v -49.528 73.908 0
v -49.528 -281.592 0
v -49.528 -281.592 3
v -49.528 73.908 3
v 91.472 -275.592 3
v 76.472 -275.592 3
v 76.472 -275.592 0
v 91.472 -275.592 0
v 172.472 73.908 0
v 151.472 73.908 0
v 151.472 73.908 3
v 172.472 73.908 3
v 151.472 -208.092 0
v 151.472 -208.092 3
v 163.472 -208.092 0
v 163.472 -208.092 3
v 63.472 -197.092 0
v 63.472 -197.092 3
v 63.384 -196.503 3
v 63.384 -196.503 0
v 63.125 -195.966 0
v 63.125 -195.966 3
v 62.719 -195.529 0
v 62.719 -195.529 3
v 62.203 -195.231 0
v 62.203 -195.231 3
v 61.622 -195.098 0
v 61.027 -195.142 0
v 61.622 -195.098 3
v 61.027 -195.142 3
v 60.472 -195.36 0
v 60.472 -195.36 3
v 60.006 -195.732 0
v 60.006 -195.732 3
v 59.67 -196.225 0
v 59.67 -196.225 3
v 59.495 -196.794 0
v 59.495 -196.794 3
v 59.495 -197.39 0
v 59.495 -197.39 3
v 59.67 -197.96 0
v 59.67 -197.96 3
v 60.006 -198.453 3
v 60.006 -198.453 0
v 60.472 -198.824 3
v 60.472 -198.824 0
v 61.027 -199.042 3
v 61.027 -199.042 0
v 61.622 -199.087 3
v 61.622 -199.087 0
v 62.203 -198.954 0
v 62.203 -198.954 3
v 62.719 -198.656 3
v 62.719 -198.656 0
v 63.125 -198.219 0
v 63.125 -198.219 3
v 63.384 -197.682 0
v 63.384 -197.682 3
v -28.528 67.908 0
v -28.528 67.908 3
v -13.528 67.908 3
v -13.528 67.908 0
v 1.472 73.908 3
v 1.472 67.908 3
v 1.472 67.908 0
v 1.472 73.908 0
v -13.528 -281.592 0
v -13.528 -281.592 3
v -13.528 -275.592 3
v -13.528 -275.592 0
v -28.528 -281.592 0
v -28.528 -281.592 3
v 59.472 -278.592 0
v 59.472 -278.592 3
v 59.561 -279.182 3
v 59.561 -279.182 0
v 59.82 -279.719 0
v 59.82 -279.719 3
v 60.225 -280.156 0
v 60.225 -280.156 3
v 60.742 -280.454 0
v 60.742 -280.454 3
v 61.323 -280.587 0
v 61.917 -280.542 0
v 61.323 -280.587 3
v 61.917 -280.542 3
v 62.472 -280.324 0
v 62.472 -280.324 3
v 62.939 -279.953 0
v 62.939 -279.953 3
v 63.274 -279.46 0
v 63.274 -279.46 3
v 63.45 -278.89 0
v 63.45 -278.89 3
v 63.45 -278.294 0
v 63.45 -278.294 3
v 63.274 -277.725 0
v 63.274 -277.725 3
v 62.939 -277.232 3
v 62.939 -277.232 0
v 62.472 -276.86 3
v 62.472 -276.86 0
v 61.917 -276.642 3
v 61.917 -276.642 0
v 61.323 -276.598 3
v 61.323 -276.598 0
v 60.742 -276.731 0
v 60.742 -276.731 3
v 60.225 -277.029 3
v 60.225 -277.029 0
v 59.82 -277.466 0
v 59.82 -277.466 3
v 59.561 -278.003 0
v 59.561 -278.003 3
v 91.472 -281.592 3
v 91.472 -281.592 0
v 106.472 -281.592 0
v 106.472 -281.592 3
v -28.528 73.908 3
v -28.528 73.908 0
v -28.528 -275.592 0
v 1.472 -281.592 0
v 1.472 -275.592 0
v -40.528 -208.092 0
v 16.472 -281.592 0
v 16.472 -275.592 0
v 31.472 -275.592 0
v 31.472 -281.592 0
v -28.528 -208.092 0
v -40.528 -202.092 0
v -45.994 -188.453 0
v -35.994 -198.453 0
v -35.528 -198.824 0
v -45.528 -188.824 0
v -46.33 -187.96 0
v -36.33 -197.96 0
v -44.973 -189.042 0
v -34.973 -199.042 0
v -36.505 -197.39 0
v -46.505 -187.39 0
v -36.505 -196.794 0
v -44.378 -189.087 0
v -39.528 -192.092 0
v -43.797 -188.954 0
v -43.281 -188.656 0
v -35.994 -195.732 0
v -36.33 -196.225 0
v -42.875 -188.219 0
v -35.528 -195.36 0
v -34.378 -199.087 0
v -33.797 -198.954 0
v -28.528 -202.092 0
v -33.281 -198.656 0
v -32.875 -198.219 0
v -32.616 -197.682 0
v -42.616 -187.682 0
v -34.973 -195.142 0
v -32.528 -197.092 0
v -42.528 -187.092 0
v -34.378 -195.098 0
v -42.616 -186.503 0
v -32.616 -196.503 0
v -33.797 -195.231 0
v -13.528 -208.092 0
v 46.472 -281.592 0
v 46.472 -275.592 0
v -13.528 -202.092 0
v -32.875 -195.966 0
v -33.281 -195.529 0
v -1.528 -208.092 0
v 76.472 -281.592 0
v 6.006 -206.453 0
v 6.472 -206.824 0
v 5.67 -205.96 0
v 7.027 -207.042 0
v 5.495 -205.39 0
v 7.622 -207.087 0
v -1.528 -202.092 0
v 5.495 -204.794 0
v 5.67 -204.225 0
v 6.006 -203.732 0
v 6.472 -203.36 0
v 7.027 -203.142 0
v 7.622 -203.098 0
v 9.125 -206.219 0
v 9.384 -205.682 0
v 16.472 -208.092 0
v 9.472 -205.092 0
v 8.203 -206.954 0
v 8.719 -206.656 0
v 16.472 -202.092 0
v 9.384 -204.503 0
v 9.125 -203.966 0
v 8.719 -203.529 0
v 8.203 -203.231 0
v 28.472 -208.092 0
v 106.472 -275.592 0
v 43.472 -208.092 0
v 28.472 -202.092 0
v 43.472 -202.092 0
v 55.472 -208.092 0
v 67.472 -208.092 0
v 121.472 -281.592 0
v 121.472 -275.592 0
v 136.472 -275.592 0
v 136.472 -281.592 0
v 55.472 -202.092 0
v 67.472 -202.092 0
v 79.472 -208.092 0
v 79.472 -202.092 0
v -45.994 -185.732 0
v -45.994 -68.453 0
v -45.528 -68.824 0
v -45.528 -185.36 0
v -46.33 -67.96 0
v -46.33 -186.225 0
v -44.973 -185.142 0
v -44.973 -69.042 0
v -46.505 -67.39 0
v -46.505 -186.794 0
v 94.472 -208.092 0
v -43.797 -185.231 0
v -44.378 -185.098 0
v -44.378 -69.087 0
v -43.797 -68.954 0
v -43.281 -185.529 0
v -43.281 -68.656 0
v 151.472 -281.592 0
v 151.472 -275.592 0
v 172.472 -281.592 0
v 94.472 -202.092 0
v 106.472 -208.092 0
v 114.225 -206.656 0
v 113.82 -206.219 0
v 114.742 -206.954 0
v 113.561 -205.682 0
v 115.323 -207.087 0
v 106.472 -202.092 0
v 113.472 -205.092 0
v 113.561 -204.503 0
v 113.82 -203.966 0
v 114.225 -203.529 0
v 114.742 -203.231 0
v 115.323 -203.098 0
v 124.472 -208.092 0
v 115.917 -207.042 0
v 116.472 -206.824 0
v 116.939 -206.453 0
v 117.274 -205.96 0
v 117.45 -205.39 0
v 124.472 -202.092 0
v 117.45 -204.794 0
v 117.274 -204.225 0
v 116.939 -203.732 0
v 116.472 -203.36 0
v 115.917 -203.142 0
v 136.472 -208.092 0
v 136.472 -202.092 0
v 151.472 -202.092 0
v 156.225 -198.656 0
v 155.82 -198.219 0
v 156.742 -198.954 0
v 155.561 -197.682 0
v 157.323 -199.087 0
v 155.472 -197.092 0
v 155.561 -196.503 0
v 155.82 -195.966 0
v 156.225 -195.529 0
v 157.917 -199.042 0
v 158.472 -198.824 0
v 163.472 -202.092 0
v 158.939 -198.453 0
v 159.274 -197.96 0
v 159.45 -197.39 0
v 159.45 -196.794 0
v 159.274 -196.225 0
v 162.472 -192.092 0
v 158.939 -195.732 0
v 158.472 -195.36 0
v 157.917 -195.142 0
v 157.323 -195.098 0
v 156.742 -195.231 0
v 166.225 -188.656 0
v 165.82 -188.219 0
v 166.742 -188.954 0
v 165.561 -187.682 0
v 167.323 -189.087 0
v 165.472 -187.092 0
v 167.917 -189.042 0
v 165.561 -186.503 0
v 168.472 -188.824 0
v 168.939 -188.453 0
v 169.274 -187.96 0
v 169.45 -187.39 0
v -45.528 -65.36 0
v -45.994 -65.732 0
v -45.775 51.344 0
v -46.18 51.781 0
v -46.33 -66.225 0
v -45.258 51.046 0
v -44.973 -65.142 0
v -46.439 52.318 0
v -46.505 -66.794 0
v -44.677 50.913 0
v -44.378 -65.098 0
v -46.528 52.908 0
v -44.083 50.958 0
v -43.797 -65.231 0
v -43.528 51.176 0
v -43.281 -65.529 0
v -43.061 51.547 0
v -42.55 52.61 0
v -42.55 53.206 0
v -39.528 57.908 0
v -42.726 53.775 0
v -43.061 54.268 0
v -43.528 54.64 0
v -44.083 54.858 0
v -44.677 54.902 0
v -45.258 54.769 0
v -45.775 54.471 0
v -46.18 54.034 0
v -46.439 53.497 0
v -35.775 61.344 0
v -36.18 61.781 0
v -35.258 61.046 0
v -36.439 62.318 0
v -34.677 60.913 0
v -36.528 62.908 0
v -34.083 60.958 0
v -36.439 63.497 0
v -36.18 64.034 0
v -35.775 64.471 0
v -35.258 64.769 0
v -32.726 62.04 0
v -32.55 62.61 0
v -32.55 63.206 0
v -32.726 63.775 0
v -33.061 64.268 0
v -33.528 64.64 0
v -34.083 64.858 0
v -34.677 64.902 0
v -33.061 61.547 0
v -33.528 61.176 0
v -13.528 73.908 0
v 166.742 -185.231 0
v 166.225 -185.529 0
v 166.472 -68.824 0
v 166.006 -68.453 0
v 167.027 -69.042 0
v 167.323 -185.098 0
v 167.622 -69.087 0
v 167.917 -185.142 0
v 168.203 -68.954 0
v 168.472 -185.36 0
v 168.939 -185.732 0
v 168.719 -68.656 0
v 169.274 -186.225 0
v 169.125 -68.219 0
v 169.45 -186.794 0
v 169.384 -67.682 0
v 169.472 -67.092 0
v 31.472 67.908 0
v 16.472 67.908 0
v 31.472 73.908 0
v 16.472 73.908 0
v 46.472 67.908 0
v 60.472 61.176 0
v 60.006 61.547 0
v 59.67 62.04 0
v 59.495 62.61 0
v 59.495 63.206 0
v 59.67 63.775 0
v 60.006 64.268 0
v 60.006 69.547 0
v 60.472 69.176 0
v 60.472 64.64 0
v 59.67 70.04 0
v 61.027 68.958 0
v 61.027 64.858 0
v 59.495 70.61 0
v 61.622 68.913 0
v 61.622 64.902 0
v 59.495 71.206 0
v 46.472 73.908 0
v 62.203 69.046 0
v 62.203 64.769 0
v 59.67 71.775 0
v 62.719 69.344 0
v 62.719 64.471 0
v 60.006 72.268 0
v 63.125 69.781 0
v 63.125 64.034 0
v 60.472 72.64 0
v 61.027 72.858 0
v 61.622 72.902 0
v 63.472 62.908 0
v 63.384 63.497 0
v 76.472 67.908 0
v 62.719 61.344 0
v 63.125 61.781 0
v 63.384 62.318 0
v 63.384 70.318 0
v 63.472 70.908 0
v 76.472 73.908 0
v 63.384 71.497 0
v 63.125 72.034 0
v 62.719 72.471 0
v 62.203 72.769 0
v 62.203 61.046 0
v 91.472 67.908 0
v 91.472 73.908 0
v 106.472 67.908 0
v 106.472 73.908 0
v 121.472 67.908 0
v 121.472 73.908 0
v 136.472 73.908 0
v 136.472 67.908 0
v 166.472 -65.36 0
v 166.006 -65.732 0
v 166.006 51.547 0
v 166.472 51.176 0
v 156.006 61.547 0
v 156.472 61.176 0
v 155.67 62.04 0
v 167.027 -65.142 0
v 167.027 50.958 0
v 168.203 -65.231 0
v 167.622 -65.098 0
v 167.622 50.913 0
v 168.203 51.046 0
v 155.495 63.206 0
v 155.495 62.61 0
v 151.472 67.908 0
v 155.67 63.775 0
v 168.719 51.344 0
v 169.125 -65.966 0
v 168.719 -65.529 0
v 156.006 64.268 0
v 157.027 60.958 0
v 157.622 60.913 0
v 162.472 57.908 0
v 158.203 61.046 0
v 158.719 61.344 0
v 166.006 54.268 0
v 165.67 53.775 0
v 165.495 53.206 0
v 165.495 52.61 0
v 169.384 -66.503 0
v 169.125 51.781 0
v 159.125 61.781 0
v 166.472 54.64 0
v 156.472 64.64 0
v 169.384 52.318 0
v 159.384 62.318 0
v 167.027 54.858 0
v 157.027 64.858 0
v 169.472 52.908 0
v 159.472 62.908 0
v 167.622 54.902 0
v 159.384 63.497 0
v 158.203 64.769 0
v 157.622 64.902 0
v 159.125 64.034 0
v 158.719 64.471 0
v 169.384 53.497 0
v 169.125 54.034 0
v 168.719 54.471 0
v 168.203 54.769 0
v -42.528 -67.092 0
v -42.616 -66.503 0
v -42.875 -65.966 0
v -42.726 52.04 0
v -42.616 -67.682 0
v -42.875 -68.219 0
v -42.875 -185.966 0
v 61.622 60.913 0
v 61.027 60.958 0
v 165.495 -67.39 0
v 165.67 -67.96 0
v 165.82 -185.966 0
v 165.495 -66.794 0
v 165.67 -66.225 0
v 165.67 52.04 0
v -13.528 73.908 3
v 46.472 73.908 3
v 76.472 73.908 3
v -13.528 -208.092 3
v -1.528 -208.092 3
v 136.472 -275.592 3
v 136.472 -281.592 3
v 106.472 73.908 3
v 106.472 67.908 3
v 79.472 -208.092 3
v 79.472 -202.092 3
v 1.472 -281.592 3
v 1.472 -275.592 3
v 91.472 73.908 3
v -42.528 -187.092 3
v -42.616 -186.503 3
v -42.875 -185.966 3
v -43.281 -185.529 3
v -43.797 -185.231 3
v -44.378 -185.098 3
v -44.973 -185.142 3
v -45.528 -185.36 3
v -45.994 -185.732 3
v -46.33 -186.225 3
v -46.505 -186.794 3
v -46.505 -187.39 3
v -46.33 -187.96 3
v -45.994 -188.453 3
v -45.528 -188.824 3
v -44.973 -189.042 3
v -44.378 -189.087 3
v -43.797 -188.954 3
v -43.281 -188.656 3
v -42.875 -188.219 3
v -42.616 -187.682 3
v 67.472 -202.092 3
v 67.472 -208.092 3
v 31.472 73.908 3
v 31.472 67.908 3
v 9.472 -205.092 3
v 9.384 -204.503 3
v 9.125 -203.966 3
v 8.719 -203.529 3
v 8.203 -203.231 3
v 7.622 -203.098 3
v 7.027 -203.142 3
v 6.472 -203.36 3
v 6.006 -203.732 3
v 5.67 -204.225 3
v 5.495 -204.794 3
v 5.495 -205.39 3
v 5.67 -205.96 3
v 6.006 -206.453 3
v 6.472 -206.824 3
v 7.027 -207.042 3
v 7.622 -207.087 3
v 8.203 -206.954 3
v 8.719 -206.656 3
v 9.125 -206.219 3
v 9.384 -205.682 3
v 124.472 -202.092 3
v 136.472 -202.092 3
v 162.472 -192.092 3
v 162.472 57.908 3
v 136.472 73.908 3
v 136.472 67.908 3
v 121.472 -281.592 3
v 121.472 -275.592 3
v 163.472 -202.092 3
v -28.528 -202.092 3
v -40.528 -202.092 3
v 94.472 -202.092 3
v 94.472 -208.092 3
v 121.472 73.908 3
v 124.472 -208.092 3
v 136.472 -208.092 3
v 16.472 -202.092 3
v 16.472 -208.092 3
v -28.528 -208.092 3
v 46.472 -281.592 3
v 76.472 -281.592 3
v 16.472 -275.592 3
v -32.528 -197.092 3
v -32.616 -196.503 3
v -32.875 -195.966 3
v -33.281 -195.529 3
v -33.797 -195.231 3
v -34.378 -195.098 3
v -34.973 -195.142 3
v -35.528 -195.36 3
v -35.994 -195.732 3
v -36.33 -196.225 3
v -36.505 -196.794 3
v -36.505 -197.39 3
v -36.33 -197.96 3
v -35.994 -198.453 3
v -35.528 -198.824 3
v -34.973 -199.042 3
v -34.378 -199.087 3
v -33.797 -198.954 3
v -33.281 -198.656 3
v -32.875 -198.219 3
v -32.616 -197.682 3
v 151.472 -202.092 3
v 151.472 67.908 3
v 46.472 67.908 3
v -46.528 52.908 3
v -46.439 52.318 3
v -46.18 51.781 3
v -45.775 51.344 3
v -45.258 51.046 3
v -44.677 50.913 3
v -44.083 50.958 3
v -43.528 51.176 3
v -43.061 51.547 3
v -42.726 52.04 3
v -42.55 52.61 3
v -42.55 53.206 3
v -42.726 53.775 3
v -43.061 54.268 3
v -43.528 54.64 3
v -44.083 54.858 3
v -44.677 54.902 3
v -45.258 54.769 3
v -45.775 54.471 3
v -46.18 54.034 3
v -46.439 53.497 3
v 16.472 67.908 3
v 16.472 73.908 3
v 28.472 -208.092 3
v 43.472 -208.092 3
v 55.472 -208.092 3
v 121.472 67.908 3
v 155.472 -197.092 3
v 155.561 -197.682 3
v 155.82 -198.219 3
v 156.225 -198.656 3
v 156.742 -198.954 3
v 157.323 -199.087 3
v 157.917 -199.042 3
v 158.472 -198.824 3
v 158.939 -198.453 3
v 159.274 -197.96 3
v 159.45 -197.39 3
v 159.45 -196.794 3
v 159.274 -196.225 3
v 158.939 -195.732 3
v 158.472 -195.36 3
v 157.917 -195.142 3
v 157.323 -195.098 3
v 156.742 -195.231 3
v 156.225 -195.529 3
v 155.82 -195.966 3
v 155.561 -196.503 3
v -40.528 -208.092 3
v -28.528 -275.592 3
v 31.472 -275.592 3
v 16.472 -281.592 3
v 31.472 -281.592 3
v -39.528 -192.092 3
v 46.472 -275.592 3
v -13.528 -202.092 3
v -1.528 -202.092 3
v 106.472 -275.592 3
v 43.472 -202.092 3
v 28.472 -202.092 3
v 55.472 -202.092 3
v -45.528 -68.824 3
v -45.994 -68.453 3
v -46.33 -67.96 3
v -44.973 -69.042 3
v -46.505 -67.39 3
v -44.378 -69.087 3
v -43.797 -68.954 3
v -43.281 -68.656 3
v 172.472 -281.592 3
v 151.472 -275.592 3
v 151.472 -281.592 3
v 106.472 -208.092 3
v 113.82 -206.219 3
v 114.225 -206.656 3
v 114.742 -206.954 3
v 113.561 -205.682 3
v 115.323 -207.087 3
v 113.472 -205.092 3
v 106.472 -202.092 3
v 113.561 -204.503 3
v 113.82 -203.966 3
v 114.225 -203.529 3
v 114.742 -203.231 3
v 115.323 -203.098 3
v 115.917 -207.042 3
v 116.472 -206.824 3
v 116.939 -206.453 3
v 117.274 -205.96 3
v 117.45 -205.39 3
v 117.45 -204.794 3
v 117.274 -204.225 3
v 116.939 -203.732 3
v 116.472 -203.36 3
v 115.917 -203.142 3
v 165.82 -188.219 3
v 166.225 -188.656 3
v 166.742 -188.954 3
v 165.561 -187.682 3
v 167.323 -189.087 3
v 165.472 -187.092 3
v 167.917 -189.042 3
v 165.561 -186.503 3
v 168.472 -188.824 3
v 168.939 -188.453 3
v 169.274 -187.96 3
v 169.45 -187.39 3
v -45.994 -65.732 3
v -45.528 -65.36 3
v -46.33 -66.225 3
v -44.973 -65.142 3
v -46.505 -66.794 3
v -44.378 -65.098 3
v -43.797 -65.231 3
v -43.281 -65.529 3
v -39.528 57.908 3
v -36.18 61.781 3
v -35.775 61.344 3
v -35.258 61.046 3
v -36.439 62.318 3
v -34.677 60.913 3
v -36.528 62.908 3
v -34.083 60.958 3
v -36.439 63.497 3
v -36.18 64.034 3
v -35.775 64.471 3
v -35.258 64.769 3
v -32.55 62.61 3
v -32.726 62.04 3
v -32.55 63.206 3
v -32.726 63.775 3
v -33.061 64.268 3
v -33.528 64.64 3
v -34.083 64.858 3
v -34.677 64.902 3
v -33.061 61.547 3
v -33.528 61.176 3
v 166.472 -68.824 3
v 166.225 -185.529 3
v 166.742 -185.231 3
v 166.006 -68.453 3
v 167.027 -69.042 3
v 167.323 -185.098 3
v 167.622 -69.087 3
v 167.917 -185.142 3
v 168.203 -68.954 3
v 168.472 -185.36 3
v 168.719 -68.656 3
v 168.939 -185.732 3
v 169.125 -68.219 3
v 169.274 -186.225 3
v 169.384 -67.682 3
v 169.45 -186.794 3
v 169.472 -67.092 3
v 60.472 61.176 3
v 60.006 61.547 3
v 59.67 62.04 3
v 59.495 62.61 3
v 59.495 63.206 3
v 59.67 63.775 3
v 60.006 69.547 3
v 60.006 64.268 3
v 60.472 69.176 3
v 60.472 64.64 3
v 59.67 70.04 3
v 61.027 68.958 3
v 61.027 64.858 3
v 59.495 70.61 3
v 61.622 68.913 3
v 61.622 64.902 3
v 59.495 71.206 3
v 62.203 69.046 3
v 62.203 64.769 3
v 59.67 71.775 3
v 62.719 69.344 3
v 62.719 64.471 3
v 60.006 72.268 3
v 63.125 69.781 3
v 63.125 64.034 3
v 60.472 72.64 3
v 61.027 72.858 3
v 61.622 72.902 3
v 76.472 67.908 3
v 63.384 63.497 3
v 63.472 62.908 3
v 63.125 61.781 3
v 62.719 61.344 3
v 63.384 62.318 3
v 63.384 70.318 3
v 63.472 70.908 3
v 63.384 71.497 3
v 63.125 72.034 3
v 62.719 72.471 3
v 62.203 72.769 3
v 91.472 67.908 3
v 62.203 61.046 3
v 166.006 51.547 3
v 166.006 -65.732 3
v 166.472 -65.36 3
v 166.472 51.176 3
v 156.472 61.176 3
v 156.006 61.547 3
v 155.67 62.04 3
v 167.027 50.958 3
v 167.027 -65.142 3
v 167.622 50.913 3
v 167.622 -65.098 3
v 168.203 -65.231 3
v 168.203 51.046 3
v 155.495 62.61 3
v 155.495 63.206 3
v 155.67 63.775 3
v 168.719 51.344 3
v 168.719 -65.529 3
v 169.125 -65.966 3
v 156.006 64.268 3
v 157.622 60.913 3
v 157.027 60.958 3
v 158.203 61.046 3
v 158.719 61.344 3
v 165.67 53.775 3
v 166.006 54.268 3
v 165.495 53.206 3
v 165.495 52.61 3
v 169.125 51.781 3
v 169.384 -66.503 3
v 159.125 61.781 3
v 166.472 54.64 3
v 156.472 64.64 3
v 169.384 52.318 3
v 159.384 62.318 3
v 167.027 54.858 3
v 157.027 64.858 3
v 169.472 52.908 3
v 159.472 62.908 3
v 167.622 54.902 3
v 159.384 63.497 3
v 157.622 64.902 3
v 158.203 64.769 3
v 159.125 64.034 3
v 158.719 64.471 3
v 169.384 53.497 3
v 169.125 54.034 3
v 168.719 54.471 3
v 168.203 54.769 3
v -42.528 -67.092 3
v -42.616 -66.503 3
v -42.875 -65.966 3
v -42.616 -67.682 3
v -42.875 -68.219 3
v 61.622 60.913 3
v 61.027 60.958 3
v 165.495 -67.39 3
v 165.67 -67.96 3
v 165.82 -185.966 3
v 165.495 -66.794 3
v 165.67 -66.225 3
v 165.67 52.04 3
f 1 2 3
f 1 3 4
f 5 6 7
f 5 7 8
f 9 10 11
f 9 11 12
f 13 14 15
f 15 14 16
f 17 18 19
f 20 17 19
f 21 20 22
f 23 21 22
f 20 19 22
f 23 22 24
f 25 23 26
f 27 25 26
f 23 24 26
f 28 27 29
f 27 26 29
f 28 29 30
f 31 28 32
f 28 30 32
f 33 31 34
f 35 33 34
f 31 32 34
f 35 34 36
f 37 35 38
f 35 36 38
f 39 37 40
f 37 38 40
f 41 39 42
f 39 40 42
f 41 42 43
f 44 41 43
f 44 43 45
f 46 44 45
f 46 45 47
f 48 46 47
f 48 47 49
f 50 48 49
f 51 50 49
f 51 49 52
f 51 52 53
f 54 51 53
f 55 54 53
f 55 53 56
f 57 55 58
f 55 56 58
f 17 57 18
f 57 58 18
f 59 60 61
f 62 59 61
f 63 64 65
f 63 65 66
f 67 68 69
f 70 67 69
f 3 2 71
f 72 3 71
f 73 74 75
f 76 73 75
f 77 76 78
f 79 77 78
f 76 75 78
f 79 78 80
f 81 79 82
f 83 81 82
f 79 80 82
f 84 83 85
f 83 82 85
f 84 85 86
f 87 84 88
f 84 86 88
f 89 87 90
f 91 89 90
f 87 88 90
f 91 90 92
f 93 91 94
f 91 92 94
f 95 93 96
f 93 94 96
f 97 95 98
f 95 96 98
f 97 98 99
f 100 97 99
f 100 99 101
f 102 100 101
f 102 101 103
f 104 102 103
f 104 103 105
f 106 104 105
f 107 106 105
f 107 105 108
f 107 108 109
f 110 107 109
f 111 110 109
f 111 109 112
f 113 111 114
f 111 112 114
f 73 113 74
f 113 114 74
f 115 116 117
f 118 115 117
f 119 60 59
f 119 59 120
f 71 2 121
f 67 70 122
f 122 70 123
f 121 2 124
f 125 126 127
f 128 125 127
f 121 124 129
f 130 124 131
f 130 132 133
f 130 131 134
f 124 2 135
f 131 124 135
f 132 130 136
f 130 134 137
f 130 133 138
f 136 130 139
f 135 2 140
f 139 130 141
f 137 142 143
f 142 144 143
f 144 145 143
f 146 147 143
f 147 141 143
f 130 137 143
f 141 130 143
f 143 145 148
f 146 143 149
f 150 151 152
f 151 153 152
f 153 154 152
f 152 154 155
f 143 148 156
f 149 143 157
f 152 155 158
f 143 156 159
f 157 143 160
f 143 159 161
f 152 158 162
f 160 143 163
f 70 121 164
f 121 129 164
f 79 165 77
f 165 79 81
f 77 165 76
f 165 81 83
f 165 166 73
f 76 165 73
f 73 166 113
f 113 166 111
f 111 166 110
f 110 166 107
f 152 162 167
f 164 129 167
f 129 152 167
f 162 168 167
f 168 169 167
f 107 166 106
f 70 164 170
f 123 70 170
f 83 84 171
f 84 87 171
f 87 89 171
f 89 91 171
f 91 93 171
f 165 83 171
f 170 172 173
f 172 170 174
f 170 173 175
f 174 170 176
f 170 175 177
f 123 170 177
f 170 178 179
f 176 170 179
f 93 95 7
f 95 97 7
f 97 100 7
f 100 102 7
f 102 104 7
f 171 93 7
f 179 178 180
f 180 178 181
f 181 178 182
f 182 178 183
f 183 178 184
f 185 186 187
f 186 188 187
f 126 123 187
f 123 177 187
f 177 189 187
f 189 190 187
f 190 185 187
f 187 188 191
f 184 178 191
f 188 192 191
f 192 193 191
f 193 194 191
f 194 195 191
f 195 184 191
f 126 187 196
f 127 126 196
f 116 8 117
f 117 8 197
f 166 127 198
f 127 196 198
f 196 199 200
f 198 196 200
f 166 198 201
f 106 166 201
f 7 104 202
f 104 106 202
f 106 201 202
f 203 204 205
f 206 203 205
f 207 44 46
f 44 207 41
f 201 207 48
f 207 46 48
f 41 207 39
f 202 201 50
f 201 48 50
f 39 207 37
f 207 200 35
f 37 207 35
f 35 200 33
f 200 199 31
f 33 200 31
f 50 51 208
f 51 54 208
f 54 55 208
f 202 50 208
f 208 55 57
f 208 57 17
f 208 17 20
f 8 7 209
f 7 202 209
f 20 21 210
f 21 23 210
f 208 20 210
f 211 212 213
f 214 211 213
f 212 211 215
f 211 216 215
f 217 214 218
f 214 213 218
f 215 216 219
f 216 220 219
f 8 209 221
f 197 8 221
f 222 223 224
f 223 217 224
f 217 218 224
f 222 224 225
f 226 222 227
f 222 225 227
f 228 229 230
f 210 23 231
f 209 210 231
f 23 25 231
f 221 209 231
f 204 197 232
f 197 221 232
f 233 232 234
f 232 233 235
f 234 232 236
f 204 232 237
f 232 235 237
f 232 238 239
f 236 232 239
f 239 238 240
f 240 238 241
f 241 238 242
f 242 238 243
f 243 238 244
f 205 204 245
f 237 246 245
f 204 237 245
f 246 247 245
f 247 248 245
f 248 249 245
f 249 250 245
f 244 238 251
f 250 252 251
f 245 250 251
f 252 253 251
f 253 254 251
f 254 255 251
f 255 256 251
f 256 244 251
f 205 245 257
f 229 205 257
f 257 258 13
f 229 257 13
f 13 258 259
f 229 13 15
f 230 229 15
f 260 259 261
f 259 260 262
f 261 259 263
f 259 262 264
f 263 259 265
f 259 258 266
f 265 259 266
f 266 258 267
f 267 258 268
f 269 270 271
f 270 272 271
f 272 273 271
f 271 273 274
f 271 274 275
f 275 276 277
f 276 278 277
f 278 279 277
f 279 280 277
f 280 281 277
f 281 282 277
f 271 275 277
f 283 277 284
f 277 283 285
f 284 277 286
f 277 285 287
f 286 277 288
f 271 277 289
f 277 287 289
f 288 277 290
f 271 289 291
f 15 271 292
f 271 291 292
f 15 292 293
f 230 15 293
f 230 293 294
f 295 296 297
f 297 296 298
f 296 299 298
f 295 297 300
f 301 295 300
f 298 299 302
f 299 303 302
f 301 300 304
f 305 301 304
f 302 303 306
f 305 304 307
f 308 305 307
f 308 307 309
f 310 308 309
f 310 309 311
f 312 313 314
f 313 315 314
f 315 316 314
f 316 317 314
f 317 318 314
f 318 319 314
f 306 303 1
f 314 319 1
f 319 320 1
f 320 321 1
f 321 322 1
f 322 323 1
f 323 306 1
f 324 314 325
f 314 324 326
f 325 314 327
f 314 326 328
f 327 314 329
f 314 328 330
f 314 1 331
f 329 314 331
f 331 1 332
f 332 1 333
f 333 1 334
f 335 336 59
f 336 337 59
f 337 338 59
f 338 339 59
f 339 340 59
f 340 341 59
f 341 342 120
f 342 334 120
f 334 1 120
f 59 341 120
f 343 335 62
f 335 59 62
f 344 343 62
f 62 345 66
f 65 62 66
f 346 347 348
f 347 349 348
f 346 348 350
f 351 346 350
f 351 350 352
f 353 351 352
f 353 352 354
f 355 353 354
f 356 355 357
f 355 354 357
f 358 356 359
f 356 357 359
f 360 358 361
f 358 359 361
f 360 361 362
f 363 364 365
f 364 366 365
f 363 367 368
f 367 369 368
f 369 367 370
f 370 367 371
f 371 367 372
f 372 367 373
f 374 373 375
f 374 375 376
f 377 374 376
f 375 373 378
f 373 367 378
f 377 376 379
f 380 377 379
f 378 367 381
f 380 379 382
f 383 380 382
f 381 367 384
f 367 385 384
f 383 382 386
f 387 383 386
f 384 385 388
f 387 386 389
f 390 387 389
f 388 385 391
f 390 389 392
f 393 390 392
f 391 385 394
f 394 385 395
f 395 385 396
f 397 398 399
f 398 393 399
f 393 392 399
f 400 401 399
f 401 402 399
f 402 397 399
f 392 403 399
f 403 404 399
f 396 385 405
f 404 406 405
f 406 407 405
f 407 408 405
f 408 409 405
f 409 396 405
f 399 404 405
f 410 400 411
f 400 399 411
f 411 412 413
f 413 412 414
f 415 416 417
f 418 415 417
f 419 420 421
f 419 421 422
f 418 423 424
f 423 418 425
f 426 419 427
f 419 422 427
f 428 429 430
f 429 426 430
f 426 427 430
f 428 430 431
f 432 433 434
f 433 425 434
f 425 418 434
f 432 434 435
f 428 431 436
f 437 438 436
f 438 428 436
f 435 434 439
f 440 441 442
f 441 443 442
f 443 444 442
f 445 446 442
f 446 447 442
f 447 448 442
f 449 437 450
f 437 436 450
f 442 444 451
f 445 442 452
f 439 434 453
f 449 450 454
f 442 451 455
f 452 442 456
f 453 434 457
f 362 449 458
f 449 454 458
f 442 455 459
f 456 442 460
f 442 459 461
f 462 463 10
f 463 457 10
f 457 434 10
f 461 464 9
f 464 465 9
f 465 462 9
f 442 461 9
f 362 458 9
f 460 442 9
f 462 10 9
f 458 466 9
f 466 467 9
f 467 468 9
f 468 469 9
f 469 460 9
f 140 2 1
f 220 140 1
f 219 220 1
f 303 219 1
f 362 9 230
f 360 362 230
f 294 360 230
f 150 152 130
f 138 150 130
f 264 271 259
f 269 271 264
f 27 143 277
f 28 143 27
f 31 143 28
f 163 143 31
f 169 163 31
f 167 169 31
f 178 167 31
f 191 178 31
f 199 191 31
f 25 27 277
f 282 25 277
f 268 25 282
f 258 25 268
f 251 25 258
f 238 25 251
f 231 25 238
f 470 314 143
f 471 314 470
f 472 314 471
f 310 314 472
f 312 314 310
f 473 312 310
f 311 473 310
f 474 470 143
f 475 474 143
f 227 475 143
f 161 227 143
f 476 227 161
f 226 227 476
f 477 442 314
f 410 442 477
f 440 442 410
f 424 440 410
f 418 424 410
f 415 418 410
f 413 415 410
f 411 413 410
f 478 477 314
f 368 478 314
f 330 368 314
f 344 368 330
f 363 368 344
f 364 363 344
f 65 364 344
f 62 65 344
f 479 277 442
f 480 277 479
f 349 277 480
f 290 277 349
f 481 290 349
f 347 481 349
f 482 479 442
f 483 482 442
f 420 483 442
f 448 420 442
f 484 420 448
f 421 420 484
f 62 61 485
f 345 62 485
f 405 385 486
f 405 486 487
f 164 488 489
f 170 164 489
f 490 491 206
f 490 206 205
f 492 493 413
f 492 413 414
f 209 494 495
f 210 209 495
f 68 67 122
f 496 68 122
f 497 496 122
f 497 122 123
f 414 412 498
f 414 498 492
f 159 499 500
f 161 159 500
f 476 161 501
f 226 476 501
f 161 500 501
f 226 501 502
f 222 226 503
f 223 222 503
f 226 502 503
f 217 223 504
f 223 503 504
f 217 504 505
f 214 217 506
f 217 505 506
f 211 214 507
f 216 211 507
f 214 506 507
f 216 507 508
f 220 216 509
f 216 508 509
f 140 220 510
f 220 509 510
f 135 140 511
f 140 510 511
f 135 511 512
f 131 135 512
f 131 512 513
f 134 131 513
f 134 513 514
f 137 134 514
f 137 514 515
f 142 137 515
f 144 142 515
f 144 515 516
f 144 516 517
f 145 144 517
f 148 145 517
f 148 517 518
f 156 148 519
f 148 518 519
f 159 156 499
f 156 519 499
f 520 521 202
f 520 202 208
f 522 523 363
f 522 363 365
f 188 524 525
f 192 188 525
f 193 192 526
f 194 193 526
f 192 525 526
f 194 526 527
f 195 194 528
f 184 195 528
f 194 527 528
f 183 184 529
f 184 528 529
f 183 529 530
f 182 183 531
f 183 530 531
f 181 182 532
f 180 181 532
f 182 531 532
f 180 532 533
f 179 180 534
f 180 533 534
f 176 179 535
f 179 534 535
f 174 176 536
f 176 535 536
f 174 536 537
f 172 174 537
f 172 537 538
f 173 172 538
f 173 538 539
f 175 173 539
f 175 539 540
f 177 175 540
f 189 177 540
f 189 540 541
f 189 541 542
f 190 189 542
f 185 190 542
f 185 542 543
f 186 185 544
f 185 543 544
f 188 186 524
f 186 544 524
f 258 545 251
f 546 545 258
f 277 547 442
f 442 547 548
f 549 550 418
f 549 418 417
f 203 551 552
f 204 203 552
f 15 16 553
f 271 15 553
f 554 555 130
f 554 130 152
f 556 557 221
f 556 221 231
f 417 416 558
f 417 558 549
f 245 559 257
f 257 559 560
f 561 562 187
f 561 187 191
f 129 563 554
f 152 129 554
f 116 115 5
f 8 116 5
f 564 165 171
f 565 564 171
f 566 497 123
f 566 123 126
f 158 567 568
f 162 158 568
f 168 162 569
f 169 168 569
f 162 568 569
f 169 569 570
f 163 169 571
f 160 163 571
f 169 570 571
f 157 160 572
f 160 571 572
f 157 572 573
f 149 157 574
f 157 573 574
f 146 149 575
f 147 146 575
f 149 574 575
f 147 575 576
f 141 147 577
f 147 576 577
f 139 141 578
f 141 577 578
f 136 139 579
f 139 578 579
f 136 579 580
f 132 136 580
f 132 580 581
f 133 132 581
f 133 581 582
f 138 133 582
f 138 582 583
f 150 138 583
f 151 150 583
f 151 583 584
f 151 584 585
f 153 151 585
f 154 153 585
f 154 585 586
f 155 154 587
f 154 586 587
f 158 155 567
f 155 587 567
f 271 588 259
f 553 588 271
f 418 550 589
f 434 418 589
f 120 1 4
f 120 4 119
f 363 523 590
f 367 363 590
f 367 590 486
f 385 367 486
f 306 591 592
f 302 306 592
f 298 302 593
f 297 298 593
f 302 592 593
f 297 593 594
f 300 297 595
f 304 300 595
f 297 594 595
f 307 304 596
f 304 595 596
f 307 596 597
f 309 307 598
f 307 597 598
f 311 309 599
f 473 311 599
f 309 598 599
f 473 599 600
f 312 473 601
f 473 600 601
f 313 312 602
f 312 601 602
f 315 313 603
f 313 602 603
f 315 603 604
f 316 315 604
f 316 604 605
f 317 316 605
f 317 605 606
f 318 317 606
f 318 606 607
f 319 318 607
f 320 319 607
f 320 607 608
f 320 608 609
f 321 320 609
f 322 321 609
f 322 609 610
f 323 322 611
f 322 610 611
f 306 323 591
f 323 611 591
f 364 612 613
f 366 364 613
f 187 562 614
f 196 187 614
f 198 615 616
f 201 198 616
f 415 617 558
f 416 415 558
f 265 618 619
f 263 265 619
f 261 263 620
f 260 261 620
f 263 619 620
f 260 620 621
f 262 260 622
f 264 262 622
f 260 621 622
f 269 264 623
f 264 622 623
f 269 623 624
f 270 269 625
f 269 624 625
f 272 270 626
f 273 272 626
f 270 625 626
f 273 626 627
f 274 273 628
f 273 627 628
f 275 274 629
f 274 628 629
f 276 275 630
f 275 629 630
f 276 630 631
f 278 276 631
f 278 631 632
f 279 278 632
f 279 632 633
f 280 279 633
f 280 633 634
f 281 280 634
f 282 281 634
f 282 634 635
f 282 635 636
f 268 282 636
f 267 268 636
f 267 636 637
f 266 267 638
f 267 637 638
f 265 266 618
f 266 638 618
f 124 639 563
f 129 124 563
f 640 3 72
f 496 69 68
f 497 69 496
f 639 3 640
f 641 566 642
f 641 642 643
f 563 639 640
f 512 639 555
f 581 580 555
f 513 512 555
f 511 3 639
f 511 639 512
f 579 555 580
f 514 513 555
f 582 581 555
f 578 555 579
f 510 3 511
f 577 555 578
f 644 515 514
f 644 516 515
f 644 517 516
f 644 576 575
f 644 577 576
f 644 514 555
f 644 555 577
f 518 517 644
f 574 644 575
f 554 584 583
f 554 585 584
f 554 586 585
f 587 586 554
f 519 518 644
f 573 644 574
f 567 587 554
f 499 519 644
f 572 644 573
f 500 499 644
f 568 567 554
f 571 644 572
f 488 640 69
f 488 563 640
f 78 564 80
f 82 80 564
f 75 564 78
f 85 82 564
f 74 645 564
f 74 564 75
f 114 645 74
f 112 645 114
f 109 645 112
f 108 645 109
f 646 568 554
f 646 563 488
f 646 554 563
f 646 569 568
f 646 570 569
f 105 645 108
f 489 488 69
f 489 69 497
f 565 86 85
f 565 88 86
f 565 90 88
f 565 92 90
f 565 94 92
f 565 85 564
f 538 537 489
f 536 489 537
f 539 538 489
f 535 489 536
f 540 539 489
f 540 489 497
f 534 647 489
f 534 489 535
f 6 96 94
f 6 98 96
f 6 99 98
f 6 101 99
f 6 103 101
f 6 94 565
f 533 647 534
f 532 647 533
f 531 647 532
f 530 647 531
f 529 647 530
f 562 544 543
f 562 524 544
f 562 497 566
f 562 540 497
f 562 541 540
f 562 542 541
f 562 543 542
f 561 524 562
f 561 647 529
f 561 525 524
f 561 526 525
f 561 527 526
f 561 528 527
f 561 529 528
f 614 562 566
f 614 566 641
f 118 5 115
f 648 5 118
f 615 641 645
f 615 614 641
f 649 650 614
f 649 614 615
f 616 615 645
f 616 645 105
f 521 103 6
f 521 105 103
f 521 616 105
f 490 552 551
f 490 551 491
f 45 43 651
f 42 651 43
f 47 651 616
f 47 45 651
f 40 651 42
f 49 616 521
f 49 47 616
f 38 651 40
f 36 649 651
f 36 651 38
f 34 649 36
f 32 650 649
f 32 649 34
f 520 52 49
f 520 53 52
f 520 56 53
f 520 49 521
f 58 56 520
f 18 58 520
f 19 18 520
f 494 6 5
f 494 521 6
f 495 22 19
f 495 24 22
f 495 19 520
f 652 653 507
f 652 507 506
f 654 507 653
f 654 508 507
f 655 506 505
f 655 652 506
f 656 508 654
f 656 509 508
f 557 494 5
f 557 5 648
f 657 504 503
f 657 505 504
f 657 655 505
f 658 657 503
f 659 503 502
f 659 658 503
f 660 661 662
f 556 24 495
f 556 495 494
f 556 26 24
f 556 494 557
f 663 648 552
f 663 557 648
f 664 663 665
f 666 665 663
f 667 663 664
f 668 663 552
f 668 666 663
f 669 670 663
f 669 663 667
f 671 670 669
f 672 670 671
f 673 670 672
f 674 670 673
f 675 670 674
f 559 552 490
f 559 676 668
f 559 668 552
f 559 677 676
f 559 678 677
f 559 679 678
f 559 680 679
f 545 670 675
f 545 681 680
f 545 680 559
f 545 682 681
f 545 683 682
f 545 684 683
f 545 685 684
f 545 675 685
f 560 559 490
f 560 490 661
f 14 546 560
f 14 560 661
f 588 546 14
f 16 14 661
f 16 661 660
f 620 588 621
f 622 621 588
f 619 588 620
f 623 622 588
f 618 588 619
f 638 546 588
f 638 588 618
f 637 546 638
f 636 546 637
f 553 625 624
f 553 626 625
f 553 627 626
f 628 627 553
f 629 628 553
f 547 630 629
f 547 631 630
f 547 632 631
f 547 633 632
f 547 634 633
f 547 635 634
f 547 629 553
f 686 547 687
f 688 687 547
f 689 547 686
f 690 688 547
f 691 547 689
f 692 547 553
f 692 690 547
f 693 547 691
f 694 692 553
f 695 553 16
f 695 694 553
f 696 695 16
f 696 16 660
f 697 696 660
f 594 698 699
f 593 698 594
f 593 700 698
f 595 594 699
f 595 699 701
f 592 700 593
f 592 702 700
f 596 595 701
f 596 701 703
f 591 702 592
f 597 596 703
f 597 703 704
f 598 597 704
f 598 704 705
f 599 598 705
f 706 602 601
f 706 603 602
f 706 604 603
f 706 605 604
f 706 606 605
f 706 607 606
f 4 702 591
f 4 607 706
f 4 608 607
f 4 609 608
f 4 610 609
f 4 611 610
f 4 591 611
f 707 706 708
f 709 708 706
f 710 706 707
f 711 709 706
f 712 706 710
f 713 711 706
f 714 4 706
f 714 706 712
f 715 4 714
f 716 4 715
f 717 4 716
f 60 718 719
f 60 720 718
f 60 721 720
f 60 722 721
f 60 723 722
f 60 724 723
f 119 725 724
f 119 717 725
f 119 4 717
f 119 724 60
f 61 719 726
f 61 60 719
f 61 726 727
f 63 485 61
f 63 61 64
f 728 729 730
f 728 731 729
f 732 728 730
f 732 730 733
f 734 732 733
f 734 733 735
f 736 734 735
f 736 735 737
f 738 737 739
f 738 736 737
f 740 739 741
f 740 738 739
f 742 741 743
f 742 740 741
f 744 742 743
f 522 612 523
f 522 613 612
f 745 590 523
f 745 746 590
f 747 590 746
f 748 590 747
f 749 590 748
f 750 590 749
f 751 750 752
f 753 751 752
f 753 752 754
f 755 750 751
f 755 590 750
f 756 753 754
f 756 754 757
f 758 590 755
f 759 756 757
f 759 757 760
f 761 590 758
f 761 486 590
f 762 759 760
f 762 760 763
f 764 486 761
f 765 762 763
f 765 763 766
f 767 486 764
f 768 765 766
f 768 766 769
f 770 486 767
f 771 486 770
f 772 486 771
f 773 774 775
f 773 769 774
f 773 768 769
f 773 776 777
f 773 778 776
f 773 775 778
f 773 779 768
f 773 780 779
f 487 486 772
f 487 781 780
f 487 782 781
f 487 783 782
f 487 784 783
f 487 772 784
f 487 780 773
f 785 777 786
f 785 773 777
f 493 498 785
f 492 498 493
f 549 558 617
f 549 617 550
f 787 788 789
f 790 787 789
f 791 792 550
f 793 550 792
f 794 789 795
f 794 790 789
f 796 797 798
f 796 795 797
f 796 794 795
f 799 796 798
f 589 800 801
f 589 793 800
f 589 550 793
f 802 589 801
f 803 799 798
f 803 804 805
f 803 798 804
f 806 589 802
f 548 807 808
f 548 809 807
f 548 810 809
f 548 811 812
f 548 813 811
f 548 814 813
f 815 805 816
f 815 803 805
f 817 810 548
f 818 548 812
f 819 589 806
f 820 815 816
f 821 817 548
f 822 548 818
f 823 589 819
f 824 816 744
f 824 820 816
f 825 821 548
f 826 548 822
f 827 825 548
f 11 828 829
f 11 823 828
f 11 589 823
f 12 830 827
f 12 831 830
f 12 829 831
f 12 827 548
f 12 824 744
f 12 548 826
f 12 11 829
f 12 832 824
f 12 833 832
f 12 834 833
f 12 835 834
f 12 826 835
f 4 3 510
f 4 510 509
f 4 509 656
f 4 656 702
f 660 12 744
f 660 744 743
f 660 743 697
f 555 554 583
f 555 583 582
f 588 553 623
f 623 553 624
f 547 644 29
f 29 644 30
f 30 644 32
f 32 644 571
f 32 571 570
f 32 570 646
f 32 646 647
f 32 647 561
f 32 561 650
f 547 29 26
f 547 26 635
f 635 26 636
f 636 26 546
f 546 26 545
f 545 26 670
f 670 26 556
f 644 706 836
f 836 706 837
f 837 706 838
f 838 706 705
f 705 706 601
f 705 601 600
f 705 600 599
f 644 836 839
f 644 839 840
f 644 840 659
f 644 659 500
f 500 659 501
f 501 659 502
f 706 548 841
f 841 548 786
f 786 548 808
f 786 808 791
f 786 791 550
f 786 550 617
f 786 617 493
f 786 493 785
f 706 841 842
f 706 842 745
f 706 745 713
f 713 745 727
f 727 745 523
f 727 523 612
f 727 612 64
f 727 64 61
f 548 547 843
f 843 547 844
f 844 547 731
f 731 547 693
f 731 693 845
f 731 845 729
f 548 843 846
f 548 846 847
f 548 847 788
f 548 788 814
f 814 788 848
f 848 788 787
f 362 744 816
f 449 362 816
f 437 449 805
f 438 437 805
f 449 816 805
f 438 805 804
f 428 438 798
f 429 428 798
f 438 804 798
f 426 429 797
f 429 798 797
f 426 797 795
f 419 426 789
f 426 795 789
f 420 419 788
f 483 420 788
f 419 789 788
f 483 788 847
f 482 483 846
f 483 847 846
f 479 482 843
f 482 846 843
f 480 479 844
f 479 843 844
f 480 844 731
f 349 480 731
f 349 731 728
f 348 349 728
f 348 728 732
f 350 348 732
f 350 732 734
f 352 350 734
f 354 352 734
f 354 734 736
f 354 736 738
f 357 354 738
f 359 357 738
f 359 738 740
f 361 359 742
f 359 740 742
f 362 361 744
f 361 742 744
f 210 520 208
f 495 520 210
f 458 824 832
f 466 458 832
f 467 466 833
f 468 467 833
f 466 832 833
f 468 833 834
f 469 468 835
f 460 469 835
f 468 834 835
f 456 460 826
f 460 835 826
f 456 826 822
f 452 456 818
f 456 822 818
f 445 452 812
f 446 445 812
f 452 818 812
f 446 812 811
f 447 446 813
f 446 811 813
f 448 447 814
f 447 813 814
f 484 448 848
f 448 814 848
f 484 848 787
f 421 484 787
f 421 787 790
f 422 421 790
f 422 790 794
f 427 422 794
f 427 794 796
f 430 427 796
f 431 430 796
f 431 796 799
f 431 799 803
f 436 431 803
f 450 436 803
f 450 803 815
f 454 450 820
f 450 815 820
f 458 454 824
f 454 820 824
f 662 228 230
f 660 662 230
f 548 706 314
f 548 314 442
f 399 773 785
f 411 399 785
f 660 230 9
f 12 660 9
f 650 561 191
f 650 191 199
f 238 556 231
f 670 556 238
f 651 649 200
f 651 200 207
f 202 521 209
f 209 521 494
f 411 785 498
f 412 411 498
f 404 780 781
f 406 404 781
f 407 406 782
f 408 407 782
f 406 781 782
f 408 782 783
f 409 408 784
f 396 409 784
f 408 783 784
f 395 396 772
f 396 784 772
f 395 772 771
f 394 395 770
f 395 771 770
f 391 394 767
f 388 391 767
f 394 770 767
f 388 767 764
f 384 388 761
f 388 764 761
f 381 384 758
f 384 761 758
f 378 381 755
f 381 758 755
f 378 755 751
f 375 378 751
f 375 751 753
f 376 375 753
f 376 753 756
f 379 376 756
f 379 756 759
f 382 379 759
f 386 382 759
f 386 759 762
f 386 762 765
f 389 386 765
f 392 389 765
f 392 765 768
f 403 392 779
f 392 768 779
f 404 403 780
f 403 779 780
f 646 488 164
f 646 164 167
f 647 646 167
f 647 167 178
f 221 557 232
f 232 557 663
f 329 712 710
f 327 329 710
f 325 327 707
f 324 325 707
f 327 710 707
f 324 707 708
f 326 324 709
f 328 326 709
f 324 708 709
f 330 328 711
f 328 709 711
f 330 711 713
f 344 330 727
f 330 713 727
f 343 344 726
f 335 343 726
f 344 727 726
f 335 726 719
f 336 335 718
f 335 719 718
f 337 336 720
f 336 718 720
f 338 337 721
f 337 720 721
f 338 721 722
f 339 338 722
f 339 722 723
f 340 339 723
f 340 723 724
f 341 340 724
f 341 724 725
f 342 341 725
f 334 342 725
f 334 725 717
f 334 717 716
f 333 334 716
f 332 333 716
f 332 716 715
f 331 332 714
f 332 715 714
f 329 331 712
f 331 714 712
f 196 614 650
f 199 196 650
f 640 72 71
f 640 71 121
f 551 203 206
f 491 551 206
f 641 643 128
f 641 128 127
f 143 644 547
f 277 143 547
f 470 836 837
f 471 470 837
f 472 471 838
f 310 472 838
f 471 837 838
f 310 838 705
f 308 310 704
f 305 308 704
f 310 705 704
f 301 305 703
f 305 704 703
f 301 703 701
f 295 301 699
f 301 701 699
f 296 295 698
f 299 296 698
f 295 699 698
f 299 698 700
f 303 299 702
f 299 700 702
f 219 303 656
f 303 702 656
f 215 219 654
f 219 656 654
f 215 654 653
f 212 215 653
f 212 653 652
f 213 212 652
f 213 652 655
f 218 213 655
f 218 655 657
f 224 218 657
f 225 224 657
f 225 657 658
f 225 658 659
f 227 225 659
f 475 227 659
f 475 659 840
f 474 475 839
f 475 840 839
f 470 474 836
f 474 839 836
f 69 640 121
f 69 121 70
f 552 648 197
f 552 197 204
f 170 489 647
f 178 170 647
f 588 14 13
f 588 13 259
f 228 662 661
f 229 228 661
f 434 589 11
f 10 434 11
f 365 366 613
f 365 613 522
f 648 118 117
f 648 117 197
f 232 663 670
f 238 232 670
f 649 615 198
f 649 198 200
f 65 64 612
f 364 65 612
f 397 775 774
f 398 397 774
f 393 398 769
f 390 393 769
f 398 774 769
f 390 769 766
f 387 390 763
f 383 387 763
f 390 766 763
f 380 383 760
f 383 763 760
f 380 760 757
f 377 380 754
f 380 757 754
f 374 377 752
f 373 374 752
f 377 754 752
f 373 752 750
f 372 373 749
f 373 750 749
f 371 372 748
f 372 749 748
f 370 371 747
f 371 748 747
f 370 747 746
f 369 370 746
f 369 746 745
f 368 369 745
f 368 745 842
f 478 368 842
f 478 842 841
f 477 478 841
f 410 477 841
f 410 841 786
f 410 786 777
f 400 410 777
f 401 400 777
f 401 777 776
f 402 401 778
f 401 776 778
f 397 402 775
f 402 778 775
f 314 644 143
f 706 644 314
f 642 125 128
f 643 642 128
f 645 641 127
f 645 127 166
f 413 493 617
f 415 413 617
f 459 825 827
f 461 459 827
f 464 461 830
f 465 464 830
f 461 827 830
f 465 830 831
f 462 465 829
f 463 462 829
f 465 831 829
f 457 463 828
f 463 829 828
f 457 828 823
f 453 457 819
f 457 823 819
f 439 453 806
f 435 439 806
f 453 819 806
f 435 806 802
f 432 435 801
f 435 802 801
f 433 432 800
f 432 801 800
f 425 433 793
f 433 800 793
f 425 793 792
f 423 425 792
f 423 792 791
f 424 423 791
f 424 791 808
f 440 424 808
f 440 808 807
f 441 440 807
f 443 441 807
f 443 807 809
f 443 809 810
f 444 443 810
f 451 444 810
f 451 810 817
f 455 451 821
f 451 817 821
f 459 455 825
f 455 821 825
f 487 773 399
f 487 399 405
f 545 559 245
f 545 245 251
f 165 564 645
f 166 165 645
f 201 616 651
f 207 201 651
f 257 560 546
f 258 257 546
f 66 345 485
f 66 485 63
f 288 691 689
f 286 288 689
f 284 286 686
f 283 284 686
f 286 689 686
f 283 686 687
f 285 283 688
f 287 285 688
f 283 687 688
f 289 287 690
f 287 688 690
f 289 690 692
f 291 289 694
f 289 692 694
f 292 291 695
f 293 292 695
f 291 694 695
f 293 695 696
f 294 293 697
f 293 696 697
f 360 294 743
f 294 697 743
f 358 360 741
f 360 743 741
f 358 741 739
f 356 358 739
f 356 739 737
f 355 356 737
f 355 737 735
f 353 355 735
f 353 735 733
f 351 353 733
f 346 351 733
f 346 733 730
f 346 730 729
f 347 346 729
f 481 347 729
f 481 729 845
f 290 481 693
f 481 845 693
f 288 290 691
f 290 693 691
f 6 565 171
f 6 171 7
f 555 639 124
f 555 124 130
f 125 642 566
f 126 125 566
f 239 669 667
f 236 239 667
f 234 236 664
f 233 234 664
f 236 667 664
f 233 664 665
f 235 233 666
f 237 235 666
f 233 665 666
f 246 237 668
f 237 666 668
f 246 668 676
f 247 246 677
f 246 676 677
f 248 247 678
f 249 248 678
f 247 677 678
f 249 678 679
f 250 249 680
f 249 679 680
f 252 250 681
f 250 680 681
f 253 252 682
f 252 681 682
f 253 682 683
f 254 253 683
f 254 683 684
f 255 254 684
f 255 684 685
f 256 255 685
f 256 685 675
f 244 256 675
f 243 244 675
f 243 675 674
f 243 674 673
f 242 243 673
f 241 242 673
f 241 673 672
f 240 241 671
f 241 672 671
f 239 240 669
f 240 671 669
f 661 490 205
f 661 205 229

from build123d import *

# Parameters (mm, degrees)
ESQUISSE1_W             = 222
ESQUISSE1_H             = 355.5
BOSS_EXTRU_1_DEPTH      = 3
ESQUISSE2_R             = 2
ESQUISSE2_W             = 15
ESQUISSE2_H             = 6
ENL_V_MAT_EXTRU_1_DEPTH = 3
ESQUISSE3_R             = 2
ESQUISSE3_W             = 12
ESQUISSE3_H             = 6
ENL_V_MAT_EXTRU_2_DEPTH = 3
ESQUISSE4_R             = 2
ESQUISSE4_W             = 202
ESQUISSE4_H             = 250
ENL_V_MAT_EXTRU_3_DEPTH = 3


with BuildPart() as part:
    # Esquisse1 → Boss.-Extru.1 (new body)
    with BuildSketch(Plane.XY):
        with Locations((61.472433281, -103.842323651)):
            Rectangle(ESQUISSE1_W, ESQUISSE1_H)
    extrude(amount=BOSS_EXTRU_1_DEPTH)

    # Esquisse2 → Enlèv. mat.-Extru.1 (cut)
    with BuildSketch(Plane.XY.offset(3)):
        with Locations((61.472433281, 70.907676349)):
            Circle(ESQUISSE2_R)
        with Locations(Location((61.472433281, -278.592323651, 0), (0, 0, 180))):
            Circle(ESQUISSE2_R)
        with Locations((8.972433281, 70.907676349)):
            Rectangle(ESQUISSE2_W, ESQUISSE2_H)
        with Locations((83.972433281, 70.907676349)):
            Rectangle(ESQUISSE2_W, ESQUISSE2_H)
        with Locations((143.972433281, 70.907676349)):
            Rectangle(ESQUISSE2_W, ESQUISSE2_H)
        with Locations((113.972433281, 70.907676349)):
            Rectangle(ESQUISSE2_W, ESQUISSE2_H)
        with Locations((-21.027566719, 70.907676349)):
            Rectangle(ESQUISSE2_W, ESQUISSE2_H)
        with Locations((38.972433281, 70.907676349)):
            Rectangle(ESQUISSE2_W, ESQUISSE2_H)
        with Locations((38.972433281, -278.592323651)):
            Rectangle(ESQUISSE2_W, ESQUISSE2_H)
        with Locations((-21.027566719, -278.592323651)):
            Rectangle(ESQUISSE2_W, ESQUISSE2_H)
        with Locations((8.972433281, -278.592323651)):
            Rectangle(ESQUISSE2_W, ESQUISSE2_H)
        with Locations((113.972433281, -278.592323651)):
            Rectangle(ESQUISSE2_W, ESQUISSE2_H)
        with Locations((143.972433281, -278.592323651)):
            Rectangle(ESQUISSE2_W, ESQUISSE2_H)
        with Locations((83.972433281, -278.592323651)):
            Rectangle(ESQUISSE2_W, ESQUISSE2_H)
    extrude(amount=-ENL_V_MAT_EXTRU_1_DEPTH, mode=Mode.SUBTRACT)

    # Esquisse3 → Enlèv. mat.-Extru.2 (cut)
    with BuildSketch(Plane.XY.offset(3)):
        with Locations((7.472433281, -205.092323651)):
            Circle(ESQUISSE3_R)
        with Locations(Location((115.472433281, -205.092323651, 0), (0, 0, 180))):
            Circle(ESQUISSE3_R)
        with Locations((49.472433281, -205.092323651)):
            Rectangle(ESQUISSE3_W, ESQUISSE3_H)
        with Locations((22.472433281, -205.092323651)):
            Rectangle(ESQUISSE3_W, ESQUISSE3_H)
        with Locations((-7.527566719, -205.092323651)):
            Rectangle(ESQUISSE3_W, ESQUISSE3_H)
        with Locations((-34.527566719, -205.092323651)):
            Rectangle(ESQUISSE3_W, ESQUISSE3_H)
        with Locations((157.472433281, -205.092323651)):
            Rectangle(ESQUISSE3_W, ESQUISSE3_H)
        with Locations((130.472433281, -205.092323651)):
            Rectangle(ESQUISSE3_W, ESQUISSE3_H)
        with Locations((100.472433281, -205.092323651)):
            Rectangle(ESQUISSE3_W, ESQUISSE3_H)
        with Locations((73.472433281, -205.092323651)):
            Rectangle(ESQUISSE3_W, ESQUISSE3_H)
    extrude(amount=-ENL_V_MAT_EXTRU_2_DEPTH, mode=Mode.SUBTRACT)

    # Esquisse4 → Enlèv. mat.-Extru.3 (cut)
    with BuildSketch(Plane.XY.offset(3)):
        with Locations((-44.527566719, -187.092323651)):
            Circle(ESQUISSE4_R)
        with Locations((-34.527566719, -197.092323651)):
            Circle(ESQUISSE4_R)
        with Locations(Location((157.472433281, -197.092323651, 0), (0, 0, 180))):
            Circle(ESQUISSE4_R)
        with Locations(Location((167.472433281, -187.092323651, 0), (0, 0, 180))):
            Circle(ESQUISSE4_R)
        with Locations((167.472433281, 52.907676349)):
            Circle(ESQUISSE4_R)
        with Locations((157.472433281, 62.907676349)):
            Circle(ESQUISSE4_R)
        with Locations(Location((-34.527566719, 62.907676349, 0), (0, 0, 180))):
            Circle(ESQUISSE4_R)
        with Locations(Location((-44.527566719, 52.907676349, 0), (0, 0, 180))):
            Circle(ESQUISSE4_R)
        with Locations((-44.527566719, -67.092323651)):
            Circle(ESQUISSE4_R)
        with Locations((167.472433281, -67.092323651)):
            Circle(ESQUISSE4_R)
        with Locations((61.472433281, 62.907676349)):
            Circle(ESQUISSE4_R)
        with Locations((61.472433281, -197.092323651)):
            Circle(ESQUISSE4_R)
        with Locations((61.472433281, -67.092323651)):
            Rectangle(ESQUISSE4_W, ESQUISSE4_H)
    extrude(amount=-ENL_V_MAT_EXTRU_3_DEPTH, mode=Mode.SUBTRACT)


solid = part.part
